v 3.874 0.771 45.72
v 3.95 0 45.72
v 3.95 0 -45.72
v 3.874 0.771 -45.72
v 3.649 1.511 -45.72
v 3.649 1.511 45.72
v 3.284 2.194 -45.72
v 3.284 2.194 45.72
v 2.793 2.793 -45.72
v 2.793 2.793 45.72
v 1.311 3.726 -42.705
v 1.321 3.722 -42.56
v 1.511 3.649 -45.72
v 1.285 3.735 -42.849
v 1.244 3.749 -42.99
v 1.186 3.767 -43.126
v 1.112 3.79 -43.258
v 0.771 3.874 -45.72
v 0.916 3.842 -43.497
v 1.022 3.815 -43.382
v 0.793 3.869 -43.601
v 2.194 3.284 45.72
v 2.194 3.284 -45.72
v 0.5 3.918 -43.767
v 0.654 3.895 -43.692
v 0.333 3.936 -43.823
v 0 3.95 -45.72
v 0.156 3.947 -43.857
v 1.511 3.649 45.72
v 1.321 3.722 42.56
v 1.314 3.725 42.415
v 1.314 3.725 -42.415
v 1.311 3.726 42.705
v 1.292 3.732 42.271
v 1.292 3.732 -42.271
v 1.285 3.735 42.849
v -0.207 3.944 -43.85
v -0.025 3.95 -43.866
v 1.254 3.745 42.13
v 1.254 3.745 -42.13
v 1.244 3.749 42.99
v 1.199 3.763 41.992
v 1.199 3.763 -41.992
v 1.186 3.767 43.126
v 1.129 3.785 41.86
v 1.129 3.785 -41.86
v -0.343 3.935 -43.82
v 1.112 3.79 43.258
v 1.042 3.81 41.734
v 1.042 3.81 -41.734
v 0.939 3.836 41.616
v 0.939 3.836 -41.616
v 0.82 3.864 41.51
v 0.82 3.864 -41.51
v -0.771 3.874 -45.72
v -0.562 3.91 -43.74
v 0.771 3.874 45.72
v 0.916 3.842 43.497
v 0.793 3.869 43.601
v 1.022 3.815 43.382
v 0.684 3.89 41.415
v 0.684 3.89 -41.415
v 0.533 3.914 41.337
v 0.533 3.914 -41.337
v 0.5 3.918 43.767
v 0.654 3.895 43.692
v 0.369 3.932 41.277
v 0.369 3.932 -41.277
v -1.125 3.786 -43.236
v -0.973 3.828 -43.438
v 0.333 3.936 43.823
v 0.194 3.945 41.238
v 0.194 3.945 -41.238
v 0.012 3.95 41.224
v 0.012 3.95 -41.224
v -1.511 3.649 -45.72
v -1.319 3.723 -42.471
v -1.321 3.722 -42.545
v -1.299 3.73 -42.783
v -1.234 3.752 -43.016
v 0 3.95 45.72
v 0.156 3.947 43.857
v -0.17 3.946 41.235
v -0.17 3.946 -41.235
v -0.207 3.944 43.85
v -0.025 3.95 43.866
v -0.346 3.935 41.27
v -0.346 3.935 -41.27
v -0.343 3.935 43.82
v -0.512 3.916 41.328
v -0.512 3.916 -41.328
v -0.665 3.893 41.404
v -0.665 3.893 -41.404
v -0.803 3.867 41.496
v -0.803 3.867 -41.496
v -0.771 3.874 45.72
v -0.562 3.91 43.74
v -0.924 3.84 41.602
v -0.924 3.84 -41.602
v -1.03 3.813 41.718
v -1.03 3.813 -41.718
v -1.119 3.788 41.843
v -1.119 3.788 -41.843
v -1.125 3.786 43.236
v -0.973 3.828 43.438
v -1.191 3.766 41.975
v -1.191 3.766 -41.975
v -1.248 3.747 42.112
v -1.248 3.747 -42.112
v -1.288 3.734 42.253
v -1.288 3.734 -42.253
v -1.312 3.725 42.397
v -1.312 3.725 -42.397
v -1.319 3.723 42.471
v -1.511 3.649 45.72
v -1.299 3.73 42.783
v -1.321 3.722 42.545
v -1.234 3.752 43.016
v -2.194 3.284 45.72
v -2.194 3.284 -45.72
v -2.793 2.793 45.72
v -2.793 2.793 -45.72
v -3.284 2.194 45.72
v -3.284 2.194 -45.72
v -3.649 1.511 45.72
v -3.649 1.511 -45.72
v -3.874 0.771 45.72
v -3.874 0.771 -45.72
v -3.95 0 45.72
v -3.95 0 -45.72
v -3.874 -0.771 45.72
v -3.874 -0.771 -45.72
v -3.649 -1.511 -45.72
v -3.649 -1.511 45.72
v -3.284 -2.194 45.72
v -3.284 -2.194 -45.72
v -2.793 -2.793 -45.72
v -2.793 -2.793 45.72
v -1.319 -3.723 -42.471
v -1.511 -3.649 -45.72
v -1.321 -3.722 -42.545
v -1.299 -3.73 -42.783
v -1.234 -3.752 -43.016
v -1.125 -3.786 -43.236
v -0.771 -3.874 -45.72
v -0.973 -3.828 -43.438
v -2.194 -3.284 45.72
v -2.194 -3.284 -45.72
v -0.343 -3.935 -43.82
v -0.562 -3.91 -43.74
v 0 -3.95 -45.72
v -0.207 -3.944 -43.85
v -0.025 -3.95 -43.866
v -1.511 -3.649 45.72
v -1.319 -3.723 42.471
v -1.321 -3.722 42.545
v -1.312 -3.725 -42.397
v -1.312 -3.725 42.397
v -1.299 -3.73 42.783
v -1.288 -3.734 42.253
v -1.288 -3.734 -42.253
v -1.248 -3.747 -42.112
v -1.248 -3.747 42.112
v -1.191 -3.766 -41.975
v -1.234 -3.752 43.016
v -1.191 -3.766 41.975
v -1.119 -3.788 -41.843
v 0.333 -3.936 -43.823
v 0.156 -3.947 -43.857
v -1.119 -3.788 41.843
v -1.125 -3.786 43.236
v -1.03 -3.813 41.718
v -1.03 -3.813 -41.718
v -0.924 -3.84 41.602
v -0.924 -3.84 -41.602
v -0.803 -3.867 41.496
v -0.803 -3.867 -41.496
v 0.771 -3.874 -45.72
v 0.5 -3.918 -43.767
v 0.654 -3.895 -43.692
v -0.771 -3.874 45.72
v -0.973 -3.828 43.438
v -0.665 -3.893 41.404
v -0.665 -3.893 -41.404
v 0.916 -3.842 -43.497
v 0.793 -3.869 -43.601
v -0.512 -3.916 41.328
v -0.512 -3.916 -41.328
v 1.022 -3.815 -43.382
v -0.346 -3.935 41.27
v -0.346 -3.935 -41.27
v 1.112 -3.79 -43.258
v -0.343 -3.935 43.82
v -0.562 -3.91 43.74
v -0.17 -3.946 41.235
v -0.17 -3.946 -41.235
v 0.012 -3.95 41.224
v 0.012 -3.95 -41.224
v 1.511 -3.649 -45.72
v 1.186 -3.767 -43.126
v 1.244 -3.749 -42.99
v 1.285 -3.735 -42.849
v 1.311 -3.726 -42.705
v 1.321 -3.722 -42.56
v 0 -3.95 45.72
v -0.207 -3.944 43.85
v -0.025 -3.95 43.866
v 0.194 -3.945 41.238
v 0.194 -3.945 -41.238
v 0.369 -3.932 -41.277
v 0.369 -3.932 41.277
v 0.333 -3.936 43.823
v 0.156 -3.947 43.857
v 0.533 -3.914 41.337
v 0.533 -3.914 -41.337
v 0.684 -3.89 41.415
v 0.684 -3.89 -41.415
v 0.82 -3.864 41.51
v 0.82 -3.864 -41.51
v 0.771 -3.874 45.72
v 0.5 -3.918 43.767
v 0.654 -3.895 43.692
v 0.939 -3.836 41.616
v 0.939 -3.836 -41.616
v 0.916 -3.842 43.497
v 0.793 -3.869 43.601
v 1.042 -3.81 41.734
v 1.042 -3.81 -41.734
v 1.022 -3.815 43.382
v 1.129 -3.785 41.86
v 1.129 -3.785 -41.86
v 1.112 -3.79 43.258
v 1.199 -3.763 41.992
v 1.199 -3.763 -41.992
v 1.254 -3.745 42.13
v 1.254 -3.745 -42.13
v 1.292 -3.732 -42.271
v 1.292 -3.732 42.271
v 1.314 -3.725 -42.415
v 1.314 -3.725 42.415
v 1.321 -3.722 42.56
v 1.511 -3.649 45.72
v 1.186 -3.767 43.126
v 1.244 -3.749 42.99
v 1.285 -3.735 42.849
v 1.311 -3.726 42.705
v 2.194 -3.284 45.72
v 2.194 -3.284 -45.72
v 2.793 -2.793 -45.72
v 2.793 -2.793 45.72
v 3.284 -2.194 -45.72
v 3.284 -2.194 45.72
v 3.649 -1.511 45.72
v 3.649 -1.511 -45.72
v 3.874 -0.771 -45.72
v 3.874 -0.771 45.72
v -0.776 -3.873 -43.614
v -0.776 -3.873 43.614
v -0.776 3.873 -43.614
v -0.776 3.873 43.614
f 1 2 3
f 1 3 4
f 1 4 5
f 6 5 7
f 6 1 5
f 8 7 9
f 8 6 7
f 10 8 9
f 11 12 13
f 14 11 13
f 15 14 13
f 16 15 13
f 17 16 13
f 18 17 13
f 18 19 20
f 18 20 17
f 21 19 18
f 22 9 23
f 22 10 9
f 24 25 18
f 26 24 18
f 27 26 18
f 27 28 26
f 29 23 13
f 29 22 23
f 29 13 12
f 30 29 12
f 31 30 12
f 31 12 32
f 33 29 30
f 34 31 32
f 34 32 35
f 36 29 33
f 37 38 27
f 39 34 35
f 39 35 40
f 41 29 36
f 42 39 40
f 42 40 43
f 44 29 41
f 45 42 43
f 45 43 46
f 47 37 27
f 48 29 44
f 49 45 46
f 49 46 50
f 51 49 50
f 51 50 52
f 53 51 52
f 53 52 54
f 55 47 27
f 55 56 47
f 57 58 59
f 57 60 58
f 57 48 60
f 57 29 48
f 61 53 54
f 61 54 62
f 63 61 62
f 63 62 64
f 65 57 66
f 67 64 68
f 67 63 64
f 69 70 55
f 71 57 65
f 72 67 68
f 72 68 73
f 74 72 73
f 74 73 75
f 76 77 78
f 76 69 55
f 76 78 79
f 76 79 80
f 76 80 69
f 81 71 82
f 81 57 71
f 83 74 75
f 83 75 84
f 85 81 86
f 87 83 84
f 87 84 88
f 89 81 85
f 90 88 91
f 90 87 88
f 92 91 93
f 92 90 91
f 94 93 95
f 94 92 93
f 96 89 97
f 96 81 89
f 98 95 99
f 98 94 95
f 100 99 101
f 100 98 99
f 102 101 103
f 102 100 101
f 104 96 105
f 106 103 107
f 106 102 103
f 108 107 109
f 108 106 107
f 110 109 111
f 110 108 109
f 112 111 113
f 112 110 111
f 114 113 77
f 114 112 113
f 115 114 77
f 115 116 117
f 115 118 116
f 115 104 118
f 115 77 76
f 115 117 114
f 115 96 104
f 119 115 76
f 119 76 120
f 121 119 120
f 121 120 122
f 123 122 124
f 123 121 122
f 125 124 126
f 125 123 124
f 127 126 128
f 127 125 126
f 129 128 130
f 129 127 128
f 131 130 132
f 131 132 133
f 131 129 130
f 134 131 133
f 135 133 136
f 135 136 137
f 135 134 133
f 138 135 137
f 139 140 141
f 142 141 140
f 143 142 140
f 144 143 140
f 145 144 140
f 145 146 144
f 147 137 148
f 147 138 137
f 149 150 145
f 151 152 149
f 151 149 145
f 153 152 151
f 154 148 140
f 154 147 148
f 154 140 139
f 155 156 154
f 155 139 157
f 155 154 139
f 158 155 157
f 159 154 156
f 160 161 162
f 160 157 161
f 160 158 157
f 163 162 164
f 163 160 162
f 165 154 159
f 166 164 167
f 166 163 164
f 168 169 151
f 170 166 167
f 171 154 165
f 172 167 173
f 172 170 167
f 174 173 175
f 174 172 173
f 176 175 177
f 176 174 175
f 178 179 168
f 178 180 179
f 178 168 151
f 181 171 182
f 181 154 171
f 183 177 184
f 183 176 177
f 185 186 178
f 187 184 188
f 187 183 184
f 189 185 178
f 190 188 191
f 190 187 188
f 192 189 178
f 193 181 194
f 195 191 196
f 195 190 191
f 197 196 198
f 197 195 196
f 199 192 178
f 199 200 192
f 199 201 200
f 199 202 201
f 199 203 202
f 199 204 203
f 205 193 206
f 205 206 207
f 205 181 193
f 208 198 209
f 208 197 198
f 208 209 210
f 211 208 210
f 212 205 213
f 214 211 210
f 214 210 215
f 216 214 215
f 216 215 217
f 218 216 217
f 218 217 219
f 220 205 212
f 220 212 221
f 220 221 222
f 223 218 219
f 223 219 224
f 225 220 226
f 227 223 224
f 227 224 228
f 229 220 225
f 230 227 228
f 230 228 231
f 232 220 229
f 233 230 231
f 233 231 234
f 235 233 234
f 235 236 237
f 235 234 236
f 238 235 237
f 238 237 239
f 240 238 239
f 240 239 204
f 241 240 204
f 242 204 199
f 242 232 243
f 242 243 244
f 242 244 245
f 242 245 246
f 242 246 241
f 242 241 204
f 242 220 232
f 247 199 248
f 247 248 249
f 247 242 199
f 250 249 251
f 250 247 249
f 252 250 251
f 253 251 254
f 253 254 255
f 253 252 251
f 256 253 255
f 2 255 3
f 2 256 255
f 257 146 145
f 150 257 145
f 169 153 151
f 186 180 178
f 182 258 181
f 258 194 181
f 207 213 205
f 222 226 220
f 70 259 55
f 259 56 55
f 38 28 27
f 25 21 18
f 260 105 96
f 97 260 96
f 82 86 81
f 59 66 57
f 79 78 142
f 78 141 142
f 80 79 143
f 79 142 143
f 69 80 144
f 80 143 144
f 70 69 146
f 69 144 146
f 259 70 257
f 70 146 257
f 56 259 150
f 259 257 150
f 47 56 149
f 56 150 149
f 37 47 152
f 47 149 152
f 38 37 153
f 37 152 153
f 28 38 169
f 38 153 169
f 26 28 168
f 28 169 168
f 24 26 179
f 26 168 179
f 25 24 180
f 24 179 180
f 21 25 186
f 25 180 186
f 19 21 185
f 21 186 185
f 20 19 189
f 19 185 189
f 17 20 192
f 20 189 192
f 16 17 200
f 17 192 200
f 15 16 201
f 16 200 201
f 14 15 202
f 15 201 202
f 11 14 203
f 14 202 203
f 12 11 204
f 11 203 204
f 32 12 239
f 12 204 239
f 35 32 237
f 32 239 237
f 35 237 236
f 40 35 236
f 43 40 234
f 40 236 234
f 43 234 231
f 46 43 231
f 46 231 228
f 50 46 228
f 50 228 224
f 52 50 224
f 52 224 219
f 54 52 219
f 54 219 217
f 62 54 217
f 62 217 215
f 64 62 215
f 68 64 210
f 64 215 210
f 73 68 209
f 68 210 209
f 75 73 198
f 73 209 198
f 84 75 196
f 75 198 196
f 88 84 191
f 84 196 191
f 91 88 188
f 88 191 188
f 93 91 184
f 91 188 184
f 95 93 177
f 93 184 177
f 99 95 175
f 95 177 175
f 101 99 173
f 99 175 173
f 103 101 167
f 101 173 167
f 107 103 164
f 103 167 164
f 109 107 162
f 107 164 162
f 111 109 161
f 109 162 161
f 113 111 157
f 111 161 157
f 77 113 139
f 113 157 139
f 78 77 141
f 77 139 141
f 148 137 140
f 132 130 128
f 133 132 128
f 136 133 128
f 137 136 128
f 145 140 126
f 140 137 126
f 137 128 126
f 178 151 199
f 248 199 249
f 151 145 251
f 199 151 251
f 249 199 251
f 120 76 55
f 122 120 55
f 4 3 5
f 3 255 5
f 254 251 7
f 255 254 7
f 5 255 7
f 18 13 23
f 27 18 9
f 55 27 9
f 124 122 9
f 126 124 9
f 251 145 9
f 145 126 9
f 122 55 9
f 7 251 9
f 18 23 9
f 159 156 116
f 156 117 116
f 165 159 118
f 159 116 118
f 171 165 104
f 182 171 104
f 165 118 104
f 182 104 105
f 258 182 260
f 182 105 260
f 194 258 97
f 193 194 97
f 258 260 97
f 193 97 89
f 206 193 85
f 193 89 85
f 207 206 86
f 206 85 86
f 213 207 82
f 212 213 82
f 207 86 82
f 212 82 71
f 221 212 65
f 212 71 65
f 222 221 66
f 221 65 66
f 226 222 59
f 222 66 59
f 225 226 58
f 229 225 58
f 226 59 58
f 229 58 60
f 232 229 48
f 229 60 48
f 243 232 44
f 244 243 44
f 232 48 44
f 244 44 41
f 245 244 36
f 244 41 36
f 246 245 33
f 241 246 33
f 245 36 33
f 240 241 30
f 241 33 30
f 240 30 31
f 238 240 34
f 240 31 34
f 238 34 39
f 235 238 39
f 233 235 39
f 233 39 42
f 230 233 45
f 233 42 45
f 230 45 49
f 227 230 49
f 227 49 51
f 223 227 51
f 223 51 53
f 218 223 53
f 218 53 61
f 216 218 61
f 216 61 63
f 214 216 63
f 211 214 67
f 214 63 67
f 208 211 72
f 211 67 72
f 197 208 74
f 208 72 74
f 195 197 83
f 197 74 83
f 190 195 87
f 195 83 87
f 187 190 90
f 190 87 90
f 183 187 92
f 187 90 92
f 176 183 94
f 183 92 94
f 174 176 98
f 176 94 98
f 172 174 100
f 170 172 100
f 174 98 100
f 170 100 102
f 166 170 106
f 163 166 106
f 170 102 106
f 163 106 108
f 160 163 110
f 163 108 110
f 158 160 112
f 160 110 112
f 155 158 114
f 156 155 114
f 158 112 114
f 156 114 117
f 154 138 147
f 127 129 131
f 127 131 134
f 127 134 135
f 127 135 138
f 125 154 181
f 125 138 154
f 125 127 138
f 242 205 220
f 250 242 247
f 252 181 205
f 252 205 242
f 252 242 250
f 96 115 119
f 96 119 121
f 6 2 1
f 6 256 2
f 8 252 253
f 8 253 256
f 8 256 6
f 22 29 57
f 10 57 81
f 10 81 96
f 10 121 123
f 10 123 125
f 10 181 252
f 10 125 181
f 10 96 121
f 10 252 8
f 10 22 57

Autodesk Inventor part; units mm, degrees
ref_plane "YZ Plane" through (0, 0, 0) normal (1, 0, 0) x (0, 1, 0)
ref_plane "XZ Plane" through (0, 0, 0) normal (0, 1, 0) x (-1, 0, 0)
ref_plane "XY Plane" through (0, 0, 0) normal (0, 0, 1) x (1, 0, 0)
sketch "Sketch1" plane through (0, 0, 0) normal (0, 0, 1) x (1, 0, 0)
  circle A0 centre (0, 0) radius 3.9497
  dimension "d0" = 7.8994
extrude "Extrusion1" add sketch "Sketch1" against normal mid plane 91.44
sketch "Sketch2" plane through (0, 0, 0) normal (0, 1, 0) x (-1, 0, 0)
  circle A0 centre (0, 42.545) radius 1.3208
  line L0 (-3.9497, 45.72) -> (3.9497, 45.72) projected
  point P0 (0, 45.72)
  dimension "d3" = 2.6416
  dimension "d4" = 3.175
extrude "Extrusion2" cut sketch "Sketch2" along normal through all both and the other way through all
mirror "Mirror1" about plane through (0, 0, 0) normal (0, 0, 1) of "Extrusion2"
properties part number "Handle_Rod" material "Steel, Mild"
